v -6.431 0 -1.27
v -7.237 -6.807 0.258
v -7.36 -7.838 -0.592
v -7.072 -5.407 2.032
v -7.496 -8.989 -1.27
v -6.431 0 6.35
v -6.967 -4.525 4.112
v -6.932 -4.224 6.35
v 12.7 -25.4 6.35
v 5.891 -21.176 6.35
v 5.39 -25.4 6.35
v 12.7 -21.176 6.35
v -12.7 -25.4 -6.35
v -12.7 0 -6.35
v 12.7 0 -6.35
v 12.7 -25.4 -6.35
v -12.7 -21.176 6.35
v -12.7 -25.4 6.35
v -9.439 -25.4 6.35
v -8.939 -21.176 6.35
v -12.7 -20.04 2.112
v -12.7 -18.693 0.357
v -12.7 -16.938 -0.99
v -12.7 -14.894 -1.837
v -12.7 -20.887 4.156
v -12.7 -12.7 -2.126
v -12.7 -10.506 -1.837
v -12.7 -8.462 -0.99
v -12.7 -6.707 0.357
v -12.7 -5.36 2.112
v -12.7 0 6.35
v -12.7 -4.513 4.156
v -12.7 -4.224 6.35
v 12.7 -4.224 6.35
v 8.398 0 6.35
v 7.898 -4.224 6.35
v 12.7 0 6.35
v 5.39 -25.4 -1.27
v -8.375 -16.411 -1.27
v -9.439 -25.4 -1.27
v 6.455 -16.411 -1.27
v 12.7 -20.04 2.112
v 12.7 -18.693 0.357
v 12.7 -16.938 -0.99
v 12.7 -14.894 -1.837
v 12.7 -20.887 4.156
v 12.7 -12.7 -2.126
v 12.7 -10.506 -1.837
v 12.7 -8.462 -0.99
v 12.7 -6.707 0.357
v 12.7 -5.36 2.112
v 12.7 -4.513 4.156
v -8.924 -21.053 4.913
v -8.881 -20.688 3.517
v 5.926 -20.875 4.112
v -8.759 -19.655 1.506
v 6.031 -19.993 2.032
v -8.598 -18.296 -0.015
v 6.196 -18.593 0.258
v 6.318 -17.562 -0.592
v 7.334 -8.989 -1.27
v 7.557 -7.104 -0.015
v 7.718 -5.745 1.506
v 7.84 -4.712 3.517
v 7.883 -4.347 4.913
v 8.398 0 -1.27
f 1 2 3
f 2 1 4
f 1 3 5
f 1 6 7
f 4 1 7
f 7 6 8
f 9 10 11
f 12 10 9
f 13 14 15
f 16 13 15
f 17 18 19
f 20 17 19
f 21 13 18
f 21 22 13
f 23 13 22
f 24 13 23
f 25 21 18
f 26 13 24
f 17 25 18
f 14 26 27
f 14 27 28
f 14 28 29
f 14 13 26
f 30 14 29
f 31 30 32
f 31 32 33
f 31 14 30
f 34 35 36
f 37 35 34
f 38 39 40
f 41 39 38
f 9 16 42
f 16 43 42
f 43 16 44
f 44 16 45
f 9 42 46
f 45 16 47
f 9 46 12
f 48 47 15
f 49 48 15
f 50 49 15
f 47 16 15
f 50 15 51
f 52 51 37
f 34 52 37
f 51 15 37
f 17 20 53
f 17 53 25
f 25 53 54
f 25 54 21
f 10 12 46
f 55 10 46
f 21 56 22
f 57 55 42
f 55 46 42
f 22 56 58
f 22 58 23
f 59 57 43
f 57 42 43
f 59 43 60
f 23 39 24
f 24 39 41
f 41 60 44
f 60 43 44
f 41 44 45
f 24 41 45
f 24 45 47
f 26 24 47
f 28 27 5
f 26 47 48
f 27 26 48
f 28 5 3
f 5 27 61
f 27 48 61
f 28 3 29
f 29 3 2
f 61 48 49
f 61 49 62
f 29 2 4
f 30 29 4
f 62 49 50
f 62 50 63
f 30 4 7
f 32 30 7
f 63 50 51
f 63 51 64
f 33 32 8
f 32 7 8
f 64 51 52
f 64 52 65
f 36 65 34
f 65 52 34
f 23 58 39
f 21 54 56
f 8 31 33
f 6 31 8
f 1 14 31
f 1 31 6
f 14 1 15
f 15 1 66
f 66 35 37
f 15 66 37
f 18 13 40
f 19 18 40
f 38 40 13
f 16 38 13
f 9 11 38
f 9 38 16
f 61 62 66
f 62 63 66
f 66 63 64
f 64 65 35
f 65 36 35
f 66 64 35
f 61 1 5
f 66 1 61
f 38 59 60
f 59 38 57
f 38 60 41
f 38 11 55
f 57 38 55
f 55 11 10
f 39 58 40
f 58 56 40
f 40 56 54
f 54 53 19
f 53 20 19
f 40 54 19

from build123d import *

# Parameters (mm, degrees)
F0_W     = 25.4
F0_H     = 12.7
F1_DEPTH = 25.4
F3_DEPTH = 7.62
F5_DEPTH = 7.62
F6_R     = 8.47557
F7_DEPTH = 25.4


with BuildPart() as f1:
    # F0 (on Front) → F1 (new body)
    with BuildSketch(Plane.XZ):
        Rectangle(F0_W, F0_H)
    extrude(amount=F1_DEPTH)

    # F2 (on face) → F3 (cut)
    with BuildSketch(Plane.XY.offset(6.35)):
        Polygon((-6.431355, 0), (-9.439249, -25.4), (-1.919514, -25.4), (1.08838, 0), align=None)
    extrude(amount=-F3_DEPTH, mode=Mode.SUBTRACT)

    # F4 (on face) → F5 (cut)
    with BuildSketch(Plane.XY.offset(6.35)):
        Polygon((-1.919514, -25.4), (5.390243, -25.4), (8.398137, 0), (1.08838, 0), align=None)
    extrude(amount=-F5_DEPTH, mode=Mode.SUBTRACT)

    # F6 (on face) → F7 (cut)
    with BuildSketch(Plane.YZ.offset(12.7)):
        with Locations((-12.7, 6.35)):
            Circle(F6_R)
    extrude(amount=-F7_DEPTH, mode=Mode.SUBTRACT)


solid = f1.part
